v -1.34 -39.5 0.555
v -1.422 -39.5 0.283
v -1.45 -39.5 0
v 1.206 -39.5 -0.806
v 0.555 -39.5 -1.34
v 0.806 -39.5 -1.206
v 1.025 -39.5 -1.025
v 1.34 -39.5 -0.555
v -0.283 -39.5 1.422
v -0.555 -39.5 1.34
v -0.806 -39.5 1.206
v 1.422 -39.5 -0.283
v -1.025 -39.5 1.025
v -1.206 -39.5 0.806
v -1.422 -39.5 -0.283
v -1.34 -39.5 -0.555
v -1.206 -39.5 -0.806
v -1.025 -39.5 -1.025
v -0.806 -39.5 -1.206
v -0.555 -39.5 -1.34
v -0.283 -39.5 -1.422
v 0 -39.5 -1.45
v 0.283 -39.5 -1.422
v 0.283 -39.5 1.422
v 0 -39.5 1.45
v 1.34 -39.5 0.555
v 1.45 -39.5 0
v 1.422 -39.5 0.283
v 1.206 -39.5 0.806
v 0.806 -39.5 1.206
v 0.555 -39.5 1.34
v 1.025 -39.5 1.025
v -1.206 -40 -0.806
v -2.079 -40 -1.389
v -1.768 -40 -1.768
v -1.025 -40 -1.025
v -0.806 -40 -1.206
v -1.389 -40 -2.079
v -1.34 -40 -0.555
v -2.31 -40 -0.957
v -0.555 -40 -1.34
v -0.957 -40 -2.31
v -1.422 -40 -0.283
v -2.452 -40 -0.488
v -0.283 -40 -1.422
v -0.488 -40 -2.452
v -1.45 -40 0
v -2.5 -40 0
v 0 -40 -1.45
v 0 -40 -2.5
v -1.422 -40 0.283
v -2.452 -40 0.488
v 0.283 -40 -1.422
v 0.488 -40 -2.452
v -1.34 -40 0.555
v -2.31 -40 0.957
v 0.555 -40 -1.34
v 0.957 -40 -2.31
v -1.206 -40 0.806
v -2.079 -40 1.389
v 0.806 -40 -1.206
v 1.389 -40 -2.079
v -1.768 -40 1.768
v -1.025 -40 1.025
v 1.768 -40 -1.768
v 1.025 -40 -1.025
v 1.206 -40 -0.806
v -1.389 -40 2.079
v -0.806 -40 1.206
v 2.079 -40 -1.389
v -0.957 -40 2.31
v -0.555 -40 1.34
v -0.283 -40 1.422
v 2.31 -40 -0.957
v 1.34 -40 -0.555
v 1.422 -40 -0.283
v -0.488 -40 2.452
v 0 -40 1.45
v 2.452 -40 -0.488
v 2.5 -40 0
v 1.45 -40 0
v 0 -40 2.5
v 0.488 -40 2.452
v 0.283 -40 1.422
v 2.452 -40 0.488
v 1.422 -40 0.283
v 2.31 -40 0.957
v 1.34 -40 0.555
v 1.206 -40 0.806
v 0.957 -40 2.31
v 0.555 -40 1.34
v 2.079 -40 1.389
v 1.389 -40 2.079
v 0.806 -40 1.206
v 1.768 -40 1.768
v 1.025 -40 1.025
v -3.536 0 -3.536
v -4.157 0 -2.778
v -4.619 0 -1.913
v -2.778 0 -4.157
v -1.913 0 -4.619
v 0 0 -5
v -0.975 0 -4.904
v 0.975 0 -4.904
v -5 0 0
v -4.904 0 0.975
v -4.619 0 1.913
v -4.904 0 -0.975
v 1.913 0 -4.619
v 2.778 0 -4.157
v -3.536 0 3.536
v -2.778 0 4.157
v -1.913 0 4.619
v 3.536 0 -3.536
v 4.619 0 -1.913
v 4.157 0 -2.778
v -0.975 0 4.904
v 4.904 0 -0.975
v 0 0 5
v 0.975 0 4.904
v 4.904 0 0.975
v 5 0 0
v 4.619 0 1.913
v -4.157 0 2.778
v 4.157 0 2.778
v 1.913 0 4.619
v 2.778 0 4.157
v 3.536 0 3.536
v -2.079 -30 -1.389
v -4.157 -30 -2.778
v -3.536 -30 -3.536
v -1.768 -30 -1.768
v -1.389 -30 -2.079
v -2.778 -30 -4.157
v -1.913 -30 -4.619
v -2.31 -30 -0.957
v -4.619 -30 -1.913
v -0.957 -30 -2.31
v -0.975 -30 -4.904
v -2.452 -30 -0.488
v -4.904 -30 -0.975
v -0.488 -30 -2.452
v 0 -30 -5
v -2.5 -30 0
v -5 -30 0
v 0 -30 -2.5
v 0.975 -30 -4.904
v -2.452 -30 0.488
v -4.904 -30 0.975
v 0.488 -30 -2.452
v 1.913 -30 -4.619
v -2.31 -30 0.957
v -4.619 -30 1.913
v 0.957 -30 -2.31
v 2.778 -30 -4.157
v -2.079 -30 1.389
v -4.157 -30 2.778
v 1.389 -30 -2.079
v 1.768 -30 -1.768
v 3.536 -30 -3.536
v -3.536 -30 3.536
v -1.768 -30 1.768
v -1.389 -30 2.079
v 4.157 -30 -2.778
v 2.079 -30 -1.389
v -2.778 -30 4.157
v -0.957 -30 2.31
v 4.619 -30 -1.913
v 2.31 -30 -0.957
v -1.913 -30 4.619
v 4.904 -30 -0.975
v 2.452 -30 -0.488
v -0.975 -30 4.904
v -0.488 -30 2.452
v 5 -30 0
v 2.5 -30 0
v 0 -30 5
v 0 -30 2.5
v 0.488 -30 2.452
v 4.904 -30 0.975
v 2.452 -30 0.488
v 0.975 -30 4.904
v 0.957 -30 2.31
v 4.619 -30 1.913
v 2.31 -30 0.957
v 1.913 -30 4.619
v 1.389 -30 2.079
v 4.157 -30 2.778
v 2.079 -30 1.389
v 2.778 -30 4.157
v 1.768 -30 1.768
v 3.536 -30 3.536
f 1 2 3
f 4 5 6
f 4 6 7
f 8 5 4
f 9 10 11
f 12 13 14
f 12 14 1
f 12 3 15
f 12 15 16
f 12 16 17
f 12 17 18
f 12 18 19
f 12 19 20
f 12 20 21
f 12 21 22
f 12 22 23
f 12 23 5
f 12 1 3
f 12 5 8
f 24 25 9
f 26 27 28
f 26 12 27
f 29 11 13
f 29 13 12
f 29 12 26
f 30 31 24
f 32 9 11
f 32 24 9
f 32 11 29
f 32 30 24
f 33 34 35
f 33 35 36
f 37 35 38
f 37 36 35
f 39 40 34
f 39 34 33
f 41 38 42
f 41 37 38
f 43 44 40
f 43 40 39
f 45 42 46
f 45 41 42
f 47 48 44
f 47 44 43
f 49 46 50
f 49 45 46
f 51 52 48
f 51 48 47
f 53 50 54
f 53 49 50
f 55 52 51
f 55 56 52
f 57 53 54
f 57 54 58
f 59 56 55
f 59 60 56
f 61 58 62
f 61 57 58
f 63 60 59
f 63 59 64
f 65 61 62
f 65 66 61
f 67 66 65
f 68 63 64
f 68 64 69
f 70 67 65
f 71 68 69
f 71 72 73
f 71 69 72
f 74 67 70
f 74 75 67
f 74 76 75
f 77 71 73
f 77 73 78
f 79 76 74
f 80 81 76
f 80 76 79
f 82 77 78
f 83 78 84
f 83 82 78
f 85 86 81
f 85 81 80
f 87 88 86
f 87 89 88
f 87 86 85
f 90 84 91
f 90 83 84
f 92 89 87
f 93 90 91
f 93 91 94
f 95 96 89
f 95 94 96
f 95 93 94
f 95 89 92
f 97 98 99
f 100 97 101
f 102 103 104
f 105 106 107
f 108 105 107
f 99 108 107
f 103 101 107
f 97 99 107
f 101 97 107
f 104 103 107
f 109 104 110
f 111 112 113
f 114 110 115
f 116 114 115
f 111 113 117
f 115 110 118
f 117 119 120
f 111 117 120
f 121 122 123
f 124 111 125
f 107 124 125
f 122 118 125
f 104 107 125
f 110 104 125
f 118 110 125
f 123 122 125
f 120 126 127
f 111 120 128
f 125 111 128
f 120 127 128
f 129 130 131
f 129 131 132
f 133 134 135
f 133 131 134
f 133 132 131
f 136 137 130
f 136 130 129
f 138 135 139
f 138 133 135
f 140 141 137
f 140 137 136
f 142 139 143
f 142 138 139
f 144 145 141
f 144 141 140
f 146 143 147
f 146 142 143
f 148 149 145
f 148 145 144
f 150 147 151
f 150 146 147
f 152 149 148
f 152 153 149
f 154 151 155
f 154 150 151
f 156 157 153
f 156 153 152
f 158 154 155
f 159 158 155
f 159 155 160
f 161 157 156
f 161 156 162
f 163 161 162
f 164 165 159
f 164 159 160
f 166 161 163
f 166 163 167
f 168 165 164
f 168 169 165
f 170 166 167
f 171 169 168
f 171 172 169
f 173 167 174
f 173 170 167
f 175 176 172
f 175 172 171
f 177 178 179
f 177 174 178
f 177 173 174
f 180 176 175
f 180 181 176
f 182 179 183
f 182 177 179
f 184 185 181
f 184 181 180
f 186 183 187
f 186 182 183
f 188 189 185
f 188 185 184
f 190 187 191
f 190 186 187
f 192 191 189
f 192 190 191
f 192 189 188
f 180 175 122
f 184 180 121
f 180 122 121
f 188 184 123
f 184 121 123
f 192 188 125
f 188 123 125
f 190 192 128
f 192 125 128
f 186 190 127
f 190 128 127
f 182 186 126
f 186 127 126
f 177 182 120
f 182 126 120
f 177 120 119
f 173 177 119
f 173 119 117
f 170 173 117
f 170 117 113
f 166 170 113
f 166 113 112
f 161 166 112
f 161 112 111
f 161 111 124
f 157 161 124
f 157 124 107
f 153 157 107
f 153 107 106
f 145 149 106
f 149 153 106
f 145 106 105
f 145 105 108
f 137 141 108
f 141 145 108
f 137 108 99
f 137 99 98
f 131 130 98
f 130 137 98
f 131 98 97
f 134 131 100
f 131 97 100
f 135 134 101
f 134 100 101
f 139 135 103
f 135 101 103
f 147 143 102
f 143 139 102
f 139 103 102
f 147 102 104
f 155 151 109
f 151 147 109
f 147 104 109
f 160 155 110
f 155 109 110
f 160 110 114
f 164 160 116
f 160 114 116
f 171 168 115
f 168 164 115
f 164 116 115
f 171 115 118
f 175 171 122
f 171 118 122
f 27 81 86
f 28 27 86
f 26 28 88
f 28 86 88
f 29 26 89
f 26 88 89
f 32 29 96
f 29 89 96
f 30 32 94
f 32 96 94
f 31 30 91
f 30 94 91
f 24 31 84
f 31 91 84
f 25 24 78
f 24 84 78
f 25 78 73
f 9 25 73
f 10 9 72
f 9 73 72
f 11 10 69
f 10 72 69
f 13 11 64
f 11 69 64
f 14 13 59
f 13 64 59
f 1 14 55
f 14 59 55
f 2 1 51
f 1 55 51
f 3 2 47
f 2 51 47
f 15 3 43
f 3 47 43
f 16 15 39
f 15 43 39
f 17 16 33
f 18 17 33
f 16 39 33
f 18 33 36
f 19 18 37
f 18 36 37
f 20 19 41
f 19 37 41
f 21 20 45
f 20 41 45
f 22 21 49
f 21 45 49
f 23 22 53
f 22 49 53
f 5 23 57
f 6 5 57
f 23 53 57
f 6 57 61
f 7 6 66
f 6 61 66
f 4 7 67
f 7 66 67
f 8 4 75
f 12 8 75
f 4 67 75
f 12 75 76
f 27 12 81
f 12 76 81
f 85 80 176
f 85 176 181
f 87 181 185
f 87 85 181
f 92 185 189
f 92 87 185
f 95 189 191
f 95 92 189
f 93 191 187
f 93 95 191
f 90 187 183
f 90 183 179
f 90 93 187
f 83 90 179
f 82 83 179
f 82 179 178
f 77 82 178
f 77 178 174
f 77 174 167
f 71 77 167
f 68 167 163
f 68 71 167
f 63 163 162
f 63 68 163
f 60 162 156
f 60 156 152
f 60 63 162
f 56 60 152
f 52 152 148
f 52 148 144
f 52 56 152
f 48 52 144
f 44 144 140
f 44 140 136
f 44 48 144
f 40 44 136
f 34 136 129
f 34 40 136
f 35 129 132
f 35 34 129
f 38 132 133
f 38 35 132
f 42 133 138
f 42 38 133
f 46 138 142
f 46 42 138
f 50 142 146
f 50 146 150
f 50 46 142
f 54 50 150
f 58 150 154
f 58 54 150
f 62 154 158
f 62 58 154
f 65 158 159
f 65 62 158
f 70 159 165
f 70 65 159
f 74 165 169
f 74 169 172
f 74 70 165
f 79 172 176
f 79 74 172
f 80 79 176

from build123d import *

# Parameters (mm, degrees)
F0_R     = 5
F1_DEPTH = 40
F2_R     = 5.5
F2_R_2   = 2.5
F3_DEPTH = 10
F4_R     = 1.45
F5_DEPTH = 0.5


with BuildPart() as f1:
    # F0 (on Front) → F1 (new body)
    with BuildSketch(Plane.XZ):
        Circle(F0_R)
    extrude(amount=F1_DEPTH)

    # F2 (on face) → F3 (cut)
    with BuildSketch(Plane.XZ.offset(40)):
        Circle(F2_R)
        Circle(F2_R_2, mode=Mode.SUBTRACT)
    extrude(amount=-F3_DEPTH, mode=Mode.SUBTRACT)

    # F4 (on face) → F5 (cut)
    with BuildSketch(Plane.XZ.offset(40)):
        Circle(F4_R)
    extrude(amount=-F5_DEPTH, mode=Mode.SUBTRACT)


solid = f1.part
